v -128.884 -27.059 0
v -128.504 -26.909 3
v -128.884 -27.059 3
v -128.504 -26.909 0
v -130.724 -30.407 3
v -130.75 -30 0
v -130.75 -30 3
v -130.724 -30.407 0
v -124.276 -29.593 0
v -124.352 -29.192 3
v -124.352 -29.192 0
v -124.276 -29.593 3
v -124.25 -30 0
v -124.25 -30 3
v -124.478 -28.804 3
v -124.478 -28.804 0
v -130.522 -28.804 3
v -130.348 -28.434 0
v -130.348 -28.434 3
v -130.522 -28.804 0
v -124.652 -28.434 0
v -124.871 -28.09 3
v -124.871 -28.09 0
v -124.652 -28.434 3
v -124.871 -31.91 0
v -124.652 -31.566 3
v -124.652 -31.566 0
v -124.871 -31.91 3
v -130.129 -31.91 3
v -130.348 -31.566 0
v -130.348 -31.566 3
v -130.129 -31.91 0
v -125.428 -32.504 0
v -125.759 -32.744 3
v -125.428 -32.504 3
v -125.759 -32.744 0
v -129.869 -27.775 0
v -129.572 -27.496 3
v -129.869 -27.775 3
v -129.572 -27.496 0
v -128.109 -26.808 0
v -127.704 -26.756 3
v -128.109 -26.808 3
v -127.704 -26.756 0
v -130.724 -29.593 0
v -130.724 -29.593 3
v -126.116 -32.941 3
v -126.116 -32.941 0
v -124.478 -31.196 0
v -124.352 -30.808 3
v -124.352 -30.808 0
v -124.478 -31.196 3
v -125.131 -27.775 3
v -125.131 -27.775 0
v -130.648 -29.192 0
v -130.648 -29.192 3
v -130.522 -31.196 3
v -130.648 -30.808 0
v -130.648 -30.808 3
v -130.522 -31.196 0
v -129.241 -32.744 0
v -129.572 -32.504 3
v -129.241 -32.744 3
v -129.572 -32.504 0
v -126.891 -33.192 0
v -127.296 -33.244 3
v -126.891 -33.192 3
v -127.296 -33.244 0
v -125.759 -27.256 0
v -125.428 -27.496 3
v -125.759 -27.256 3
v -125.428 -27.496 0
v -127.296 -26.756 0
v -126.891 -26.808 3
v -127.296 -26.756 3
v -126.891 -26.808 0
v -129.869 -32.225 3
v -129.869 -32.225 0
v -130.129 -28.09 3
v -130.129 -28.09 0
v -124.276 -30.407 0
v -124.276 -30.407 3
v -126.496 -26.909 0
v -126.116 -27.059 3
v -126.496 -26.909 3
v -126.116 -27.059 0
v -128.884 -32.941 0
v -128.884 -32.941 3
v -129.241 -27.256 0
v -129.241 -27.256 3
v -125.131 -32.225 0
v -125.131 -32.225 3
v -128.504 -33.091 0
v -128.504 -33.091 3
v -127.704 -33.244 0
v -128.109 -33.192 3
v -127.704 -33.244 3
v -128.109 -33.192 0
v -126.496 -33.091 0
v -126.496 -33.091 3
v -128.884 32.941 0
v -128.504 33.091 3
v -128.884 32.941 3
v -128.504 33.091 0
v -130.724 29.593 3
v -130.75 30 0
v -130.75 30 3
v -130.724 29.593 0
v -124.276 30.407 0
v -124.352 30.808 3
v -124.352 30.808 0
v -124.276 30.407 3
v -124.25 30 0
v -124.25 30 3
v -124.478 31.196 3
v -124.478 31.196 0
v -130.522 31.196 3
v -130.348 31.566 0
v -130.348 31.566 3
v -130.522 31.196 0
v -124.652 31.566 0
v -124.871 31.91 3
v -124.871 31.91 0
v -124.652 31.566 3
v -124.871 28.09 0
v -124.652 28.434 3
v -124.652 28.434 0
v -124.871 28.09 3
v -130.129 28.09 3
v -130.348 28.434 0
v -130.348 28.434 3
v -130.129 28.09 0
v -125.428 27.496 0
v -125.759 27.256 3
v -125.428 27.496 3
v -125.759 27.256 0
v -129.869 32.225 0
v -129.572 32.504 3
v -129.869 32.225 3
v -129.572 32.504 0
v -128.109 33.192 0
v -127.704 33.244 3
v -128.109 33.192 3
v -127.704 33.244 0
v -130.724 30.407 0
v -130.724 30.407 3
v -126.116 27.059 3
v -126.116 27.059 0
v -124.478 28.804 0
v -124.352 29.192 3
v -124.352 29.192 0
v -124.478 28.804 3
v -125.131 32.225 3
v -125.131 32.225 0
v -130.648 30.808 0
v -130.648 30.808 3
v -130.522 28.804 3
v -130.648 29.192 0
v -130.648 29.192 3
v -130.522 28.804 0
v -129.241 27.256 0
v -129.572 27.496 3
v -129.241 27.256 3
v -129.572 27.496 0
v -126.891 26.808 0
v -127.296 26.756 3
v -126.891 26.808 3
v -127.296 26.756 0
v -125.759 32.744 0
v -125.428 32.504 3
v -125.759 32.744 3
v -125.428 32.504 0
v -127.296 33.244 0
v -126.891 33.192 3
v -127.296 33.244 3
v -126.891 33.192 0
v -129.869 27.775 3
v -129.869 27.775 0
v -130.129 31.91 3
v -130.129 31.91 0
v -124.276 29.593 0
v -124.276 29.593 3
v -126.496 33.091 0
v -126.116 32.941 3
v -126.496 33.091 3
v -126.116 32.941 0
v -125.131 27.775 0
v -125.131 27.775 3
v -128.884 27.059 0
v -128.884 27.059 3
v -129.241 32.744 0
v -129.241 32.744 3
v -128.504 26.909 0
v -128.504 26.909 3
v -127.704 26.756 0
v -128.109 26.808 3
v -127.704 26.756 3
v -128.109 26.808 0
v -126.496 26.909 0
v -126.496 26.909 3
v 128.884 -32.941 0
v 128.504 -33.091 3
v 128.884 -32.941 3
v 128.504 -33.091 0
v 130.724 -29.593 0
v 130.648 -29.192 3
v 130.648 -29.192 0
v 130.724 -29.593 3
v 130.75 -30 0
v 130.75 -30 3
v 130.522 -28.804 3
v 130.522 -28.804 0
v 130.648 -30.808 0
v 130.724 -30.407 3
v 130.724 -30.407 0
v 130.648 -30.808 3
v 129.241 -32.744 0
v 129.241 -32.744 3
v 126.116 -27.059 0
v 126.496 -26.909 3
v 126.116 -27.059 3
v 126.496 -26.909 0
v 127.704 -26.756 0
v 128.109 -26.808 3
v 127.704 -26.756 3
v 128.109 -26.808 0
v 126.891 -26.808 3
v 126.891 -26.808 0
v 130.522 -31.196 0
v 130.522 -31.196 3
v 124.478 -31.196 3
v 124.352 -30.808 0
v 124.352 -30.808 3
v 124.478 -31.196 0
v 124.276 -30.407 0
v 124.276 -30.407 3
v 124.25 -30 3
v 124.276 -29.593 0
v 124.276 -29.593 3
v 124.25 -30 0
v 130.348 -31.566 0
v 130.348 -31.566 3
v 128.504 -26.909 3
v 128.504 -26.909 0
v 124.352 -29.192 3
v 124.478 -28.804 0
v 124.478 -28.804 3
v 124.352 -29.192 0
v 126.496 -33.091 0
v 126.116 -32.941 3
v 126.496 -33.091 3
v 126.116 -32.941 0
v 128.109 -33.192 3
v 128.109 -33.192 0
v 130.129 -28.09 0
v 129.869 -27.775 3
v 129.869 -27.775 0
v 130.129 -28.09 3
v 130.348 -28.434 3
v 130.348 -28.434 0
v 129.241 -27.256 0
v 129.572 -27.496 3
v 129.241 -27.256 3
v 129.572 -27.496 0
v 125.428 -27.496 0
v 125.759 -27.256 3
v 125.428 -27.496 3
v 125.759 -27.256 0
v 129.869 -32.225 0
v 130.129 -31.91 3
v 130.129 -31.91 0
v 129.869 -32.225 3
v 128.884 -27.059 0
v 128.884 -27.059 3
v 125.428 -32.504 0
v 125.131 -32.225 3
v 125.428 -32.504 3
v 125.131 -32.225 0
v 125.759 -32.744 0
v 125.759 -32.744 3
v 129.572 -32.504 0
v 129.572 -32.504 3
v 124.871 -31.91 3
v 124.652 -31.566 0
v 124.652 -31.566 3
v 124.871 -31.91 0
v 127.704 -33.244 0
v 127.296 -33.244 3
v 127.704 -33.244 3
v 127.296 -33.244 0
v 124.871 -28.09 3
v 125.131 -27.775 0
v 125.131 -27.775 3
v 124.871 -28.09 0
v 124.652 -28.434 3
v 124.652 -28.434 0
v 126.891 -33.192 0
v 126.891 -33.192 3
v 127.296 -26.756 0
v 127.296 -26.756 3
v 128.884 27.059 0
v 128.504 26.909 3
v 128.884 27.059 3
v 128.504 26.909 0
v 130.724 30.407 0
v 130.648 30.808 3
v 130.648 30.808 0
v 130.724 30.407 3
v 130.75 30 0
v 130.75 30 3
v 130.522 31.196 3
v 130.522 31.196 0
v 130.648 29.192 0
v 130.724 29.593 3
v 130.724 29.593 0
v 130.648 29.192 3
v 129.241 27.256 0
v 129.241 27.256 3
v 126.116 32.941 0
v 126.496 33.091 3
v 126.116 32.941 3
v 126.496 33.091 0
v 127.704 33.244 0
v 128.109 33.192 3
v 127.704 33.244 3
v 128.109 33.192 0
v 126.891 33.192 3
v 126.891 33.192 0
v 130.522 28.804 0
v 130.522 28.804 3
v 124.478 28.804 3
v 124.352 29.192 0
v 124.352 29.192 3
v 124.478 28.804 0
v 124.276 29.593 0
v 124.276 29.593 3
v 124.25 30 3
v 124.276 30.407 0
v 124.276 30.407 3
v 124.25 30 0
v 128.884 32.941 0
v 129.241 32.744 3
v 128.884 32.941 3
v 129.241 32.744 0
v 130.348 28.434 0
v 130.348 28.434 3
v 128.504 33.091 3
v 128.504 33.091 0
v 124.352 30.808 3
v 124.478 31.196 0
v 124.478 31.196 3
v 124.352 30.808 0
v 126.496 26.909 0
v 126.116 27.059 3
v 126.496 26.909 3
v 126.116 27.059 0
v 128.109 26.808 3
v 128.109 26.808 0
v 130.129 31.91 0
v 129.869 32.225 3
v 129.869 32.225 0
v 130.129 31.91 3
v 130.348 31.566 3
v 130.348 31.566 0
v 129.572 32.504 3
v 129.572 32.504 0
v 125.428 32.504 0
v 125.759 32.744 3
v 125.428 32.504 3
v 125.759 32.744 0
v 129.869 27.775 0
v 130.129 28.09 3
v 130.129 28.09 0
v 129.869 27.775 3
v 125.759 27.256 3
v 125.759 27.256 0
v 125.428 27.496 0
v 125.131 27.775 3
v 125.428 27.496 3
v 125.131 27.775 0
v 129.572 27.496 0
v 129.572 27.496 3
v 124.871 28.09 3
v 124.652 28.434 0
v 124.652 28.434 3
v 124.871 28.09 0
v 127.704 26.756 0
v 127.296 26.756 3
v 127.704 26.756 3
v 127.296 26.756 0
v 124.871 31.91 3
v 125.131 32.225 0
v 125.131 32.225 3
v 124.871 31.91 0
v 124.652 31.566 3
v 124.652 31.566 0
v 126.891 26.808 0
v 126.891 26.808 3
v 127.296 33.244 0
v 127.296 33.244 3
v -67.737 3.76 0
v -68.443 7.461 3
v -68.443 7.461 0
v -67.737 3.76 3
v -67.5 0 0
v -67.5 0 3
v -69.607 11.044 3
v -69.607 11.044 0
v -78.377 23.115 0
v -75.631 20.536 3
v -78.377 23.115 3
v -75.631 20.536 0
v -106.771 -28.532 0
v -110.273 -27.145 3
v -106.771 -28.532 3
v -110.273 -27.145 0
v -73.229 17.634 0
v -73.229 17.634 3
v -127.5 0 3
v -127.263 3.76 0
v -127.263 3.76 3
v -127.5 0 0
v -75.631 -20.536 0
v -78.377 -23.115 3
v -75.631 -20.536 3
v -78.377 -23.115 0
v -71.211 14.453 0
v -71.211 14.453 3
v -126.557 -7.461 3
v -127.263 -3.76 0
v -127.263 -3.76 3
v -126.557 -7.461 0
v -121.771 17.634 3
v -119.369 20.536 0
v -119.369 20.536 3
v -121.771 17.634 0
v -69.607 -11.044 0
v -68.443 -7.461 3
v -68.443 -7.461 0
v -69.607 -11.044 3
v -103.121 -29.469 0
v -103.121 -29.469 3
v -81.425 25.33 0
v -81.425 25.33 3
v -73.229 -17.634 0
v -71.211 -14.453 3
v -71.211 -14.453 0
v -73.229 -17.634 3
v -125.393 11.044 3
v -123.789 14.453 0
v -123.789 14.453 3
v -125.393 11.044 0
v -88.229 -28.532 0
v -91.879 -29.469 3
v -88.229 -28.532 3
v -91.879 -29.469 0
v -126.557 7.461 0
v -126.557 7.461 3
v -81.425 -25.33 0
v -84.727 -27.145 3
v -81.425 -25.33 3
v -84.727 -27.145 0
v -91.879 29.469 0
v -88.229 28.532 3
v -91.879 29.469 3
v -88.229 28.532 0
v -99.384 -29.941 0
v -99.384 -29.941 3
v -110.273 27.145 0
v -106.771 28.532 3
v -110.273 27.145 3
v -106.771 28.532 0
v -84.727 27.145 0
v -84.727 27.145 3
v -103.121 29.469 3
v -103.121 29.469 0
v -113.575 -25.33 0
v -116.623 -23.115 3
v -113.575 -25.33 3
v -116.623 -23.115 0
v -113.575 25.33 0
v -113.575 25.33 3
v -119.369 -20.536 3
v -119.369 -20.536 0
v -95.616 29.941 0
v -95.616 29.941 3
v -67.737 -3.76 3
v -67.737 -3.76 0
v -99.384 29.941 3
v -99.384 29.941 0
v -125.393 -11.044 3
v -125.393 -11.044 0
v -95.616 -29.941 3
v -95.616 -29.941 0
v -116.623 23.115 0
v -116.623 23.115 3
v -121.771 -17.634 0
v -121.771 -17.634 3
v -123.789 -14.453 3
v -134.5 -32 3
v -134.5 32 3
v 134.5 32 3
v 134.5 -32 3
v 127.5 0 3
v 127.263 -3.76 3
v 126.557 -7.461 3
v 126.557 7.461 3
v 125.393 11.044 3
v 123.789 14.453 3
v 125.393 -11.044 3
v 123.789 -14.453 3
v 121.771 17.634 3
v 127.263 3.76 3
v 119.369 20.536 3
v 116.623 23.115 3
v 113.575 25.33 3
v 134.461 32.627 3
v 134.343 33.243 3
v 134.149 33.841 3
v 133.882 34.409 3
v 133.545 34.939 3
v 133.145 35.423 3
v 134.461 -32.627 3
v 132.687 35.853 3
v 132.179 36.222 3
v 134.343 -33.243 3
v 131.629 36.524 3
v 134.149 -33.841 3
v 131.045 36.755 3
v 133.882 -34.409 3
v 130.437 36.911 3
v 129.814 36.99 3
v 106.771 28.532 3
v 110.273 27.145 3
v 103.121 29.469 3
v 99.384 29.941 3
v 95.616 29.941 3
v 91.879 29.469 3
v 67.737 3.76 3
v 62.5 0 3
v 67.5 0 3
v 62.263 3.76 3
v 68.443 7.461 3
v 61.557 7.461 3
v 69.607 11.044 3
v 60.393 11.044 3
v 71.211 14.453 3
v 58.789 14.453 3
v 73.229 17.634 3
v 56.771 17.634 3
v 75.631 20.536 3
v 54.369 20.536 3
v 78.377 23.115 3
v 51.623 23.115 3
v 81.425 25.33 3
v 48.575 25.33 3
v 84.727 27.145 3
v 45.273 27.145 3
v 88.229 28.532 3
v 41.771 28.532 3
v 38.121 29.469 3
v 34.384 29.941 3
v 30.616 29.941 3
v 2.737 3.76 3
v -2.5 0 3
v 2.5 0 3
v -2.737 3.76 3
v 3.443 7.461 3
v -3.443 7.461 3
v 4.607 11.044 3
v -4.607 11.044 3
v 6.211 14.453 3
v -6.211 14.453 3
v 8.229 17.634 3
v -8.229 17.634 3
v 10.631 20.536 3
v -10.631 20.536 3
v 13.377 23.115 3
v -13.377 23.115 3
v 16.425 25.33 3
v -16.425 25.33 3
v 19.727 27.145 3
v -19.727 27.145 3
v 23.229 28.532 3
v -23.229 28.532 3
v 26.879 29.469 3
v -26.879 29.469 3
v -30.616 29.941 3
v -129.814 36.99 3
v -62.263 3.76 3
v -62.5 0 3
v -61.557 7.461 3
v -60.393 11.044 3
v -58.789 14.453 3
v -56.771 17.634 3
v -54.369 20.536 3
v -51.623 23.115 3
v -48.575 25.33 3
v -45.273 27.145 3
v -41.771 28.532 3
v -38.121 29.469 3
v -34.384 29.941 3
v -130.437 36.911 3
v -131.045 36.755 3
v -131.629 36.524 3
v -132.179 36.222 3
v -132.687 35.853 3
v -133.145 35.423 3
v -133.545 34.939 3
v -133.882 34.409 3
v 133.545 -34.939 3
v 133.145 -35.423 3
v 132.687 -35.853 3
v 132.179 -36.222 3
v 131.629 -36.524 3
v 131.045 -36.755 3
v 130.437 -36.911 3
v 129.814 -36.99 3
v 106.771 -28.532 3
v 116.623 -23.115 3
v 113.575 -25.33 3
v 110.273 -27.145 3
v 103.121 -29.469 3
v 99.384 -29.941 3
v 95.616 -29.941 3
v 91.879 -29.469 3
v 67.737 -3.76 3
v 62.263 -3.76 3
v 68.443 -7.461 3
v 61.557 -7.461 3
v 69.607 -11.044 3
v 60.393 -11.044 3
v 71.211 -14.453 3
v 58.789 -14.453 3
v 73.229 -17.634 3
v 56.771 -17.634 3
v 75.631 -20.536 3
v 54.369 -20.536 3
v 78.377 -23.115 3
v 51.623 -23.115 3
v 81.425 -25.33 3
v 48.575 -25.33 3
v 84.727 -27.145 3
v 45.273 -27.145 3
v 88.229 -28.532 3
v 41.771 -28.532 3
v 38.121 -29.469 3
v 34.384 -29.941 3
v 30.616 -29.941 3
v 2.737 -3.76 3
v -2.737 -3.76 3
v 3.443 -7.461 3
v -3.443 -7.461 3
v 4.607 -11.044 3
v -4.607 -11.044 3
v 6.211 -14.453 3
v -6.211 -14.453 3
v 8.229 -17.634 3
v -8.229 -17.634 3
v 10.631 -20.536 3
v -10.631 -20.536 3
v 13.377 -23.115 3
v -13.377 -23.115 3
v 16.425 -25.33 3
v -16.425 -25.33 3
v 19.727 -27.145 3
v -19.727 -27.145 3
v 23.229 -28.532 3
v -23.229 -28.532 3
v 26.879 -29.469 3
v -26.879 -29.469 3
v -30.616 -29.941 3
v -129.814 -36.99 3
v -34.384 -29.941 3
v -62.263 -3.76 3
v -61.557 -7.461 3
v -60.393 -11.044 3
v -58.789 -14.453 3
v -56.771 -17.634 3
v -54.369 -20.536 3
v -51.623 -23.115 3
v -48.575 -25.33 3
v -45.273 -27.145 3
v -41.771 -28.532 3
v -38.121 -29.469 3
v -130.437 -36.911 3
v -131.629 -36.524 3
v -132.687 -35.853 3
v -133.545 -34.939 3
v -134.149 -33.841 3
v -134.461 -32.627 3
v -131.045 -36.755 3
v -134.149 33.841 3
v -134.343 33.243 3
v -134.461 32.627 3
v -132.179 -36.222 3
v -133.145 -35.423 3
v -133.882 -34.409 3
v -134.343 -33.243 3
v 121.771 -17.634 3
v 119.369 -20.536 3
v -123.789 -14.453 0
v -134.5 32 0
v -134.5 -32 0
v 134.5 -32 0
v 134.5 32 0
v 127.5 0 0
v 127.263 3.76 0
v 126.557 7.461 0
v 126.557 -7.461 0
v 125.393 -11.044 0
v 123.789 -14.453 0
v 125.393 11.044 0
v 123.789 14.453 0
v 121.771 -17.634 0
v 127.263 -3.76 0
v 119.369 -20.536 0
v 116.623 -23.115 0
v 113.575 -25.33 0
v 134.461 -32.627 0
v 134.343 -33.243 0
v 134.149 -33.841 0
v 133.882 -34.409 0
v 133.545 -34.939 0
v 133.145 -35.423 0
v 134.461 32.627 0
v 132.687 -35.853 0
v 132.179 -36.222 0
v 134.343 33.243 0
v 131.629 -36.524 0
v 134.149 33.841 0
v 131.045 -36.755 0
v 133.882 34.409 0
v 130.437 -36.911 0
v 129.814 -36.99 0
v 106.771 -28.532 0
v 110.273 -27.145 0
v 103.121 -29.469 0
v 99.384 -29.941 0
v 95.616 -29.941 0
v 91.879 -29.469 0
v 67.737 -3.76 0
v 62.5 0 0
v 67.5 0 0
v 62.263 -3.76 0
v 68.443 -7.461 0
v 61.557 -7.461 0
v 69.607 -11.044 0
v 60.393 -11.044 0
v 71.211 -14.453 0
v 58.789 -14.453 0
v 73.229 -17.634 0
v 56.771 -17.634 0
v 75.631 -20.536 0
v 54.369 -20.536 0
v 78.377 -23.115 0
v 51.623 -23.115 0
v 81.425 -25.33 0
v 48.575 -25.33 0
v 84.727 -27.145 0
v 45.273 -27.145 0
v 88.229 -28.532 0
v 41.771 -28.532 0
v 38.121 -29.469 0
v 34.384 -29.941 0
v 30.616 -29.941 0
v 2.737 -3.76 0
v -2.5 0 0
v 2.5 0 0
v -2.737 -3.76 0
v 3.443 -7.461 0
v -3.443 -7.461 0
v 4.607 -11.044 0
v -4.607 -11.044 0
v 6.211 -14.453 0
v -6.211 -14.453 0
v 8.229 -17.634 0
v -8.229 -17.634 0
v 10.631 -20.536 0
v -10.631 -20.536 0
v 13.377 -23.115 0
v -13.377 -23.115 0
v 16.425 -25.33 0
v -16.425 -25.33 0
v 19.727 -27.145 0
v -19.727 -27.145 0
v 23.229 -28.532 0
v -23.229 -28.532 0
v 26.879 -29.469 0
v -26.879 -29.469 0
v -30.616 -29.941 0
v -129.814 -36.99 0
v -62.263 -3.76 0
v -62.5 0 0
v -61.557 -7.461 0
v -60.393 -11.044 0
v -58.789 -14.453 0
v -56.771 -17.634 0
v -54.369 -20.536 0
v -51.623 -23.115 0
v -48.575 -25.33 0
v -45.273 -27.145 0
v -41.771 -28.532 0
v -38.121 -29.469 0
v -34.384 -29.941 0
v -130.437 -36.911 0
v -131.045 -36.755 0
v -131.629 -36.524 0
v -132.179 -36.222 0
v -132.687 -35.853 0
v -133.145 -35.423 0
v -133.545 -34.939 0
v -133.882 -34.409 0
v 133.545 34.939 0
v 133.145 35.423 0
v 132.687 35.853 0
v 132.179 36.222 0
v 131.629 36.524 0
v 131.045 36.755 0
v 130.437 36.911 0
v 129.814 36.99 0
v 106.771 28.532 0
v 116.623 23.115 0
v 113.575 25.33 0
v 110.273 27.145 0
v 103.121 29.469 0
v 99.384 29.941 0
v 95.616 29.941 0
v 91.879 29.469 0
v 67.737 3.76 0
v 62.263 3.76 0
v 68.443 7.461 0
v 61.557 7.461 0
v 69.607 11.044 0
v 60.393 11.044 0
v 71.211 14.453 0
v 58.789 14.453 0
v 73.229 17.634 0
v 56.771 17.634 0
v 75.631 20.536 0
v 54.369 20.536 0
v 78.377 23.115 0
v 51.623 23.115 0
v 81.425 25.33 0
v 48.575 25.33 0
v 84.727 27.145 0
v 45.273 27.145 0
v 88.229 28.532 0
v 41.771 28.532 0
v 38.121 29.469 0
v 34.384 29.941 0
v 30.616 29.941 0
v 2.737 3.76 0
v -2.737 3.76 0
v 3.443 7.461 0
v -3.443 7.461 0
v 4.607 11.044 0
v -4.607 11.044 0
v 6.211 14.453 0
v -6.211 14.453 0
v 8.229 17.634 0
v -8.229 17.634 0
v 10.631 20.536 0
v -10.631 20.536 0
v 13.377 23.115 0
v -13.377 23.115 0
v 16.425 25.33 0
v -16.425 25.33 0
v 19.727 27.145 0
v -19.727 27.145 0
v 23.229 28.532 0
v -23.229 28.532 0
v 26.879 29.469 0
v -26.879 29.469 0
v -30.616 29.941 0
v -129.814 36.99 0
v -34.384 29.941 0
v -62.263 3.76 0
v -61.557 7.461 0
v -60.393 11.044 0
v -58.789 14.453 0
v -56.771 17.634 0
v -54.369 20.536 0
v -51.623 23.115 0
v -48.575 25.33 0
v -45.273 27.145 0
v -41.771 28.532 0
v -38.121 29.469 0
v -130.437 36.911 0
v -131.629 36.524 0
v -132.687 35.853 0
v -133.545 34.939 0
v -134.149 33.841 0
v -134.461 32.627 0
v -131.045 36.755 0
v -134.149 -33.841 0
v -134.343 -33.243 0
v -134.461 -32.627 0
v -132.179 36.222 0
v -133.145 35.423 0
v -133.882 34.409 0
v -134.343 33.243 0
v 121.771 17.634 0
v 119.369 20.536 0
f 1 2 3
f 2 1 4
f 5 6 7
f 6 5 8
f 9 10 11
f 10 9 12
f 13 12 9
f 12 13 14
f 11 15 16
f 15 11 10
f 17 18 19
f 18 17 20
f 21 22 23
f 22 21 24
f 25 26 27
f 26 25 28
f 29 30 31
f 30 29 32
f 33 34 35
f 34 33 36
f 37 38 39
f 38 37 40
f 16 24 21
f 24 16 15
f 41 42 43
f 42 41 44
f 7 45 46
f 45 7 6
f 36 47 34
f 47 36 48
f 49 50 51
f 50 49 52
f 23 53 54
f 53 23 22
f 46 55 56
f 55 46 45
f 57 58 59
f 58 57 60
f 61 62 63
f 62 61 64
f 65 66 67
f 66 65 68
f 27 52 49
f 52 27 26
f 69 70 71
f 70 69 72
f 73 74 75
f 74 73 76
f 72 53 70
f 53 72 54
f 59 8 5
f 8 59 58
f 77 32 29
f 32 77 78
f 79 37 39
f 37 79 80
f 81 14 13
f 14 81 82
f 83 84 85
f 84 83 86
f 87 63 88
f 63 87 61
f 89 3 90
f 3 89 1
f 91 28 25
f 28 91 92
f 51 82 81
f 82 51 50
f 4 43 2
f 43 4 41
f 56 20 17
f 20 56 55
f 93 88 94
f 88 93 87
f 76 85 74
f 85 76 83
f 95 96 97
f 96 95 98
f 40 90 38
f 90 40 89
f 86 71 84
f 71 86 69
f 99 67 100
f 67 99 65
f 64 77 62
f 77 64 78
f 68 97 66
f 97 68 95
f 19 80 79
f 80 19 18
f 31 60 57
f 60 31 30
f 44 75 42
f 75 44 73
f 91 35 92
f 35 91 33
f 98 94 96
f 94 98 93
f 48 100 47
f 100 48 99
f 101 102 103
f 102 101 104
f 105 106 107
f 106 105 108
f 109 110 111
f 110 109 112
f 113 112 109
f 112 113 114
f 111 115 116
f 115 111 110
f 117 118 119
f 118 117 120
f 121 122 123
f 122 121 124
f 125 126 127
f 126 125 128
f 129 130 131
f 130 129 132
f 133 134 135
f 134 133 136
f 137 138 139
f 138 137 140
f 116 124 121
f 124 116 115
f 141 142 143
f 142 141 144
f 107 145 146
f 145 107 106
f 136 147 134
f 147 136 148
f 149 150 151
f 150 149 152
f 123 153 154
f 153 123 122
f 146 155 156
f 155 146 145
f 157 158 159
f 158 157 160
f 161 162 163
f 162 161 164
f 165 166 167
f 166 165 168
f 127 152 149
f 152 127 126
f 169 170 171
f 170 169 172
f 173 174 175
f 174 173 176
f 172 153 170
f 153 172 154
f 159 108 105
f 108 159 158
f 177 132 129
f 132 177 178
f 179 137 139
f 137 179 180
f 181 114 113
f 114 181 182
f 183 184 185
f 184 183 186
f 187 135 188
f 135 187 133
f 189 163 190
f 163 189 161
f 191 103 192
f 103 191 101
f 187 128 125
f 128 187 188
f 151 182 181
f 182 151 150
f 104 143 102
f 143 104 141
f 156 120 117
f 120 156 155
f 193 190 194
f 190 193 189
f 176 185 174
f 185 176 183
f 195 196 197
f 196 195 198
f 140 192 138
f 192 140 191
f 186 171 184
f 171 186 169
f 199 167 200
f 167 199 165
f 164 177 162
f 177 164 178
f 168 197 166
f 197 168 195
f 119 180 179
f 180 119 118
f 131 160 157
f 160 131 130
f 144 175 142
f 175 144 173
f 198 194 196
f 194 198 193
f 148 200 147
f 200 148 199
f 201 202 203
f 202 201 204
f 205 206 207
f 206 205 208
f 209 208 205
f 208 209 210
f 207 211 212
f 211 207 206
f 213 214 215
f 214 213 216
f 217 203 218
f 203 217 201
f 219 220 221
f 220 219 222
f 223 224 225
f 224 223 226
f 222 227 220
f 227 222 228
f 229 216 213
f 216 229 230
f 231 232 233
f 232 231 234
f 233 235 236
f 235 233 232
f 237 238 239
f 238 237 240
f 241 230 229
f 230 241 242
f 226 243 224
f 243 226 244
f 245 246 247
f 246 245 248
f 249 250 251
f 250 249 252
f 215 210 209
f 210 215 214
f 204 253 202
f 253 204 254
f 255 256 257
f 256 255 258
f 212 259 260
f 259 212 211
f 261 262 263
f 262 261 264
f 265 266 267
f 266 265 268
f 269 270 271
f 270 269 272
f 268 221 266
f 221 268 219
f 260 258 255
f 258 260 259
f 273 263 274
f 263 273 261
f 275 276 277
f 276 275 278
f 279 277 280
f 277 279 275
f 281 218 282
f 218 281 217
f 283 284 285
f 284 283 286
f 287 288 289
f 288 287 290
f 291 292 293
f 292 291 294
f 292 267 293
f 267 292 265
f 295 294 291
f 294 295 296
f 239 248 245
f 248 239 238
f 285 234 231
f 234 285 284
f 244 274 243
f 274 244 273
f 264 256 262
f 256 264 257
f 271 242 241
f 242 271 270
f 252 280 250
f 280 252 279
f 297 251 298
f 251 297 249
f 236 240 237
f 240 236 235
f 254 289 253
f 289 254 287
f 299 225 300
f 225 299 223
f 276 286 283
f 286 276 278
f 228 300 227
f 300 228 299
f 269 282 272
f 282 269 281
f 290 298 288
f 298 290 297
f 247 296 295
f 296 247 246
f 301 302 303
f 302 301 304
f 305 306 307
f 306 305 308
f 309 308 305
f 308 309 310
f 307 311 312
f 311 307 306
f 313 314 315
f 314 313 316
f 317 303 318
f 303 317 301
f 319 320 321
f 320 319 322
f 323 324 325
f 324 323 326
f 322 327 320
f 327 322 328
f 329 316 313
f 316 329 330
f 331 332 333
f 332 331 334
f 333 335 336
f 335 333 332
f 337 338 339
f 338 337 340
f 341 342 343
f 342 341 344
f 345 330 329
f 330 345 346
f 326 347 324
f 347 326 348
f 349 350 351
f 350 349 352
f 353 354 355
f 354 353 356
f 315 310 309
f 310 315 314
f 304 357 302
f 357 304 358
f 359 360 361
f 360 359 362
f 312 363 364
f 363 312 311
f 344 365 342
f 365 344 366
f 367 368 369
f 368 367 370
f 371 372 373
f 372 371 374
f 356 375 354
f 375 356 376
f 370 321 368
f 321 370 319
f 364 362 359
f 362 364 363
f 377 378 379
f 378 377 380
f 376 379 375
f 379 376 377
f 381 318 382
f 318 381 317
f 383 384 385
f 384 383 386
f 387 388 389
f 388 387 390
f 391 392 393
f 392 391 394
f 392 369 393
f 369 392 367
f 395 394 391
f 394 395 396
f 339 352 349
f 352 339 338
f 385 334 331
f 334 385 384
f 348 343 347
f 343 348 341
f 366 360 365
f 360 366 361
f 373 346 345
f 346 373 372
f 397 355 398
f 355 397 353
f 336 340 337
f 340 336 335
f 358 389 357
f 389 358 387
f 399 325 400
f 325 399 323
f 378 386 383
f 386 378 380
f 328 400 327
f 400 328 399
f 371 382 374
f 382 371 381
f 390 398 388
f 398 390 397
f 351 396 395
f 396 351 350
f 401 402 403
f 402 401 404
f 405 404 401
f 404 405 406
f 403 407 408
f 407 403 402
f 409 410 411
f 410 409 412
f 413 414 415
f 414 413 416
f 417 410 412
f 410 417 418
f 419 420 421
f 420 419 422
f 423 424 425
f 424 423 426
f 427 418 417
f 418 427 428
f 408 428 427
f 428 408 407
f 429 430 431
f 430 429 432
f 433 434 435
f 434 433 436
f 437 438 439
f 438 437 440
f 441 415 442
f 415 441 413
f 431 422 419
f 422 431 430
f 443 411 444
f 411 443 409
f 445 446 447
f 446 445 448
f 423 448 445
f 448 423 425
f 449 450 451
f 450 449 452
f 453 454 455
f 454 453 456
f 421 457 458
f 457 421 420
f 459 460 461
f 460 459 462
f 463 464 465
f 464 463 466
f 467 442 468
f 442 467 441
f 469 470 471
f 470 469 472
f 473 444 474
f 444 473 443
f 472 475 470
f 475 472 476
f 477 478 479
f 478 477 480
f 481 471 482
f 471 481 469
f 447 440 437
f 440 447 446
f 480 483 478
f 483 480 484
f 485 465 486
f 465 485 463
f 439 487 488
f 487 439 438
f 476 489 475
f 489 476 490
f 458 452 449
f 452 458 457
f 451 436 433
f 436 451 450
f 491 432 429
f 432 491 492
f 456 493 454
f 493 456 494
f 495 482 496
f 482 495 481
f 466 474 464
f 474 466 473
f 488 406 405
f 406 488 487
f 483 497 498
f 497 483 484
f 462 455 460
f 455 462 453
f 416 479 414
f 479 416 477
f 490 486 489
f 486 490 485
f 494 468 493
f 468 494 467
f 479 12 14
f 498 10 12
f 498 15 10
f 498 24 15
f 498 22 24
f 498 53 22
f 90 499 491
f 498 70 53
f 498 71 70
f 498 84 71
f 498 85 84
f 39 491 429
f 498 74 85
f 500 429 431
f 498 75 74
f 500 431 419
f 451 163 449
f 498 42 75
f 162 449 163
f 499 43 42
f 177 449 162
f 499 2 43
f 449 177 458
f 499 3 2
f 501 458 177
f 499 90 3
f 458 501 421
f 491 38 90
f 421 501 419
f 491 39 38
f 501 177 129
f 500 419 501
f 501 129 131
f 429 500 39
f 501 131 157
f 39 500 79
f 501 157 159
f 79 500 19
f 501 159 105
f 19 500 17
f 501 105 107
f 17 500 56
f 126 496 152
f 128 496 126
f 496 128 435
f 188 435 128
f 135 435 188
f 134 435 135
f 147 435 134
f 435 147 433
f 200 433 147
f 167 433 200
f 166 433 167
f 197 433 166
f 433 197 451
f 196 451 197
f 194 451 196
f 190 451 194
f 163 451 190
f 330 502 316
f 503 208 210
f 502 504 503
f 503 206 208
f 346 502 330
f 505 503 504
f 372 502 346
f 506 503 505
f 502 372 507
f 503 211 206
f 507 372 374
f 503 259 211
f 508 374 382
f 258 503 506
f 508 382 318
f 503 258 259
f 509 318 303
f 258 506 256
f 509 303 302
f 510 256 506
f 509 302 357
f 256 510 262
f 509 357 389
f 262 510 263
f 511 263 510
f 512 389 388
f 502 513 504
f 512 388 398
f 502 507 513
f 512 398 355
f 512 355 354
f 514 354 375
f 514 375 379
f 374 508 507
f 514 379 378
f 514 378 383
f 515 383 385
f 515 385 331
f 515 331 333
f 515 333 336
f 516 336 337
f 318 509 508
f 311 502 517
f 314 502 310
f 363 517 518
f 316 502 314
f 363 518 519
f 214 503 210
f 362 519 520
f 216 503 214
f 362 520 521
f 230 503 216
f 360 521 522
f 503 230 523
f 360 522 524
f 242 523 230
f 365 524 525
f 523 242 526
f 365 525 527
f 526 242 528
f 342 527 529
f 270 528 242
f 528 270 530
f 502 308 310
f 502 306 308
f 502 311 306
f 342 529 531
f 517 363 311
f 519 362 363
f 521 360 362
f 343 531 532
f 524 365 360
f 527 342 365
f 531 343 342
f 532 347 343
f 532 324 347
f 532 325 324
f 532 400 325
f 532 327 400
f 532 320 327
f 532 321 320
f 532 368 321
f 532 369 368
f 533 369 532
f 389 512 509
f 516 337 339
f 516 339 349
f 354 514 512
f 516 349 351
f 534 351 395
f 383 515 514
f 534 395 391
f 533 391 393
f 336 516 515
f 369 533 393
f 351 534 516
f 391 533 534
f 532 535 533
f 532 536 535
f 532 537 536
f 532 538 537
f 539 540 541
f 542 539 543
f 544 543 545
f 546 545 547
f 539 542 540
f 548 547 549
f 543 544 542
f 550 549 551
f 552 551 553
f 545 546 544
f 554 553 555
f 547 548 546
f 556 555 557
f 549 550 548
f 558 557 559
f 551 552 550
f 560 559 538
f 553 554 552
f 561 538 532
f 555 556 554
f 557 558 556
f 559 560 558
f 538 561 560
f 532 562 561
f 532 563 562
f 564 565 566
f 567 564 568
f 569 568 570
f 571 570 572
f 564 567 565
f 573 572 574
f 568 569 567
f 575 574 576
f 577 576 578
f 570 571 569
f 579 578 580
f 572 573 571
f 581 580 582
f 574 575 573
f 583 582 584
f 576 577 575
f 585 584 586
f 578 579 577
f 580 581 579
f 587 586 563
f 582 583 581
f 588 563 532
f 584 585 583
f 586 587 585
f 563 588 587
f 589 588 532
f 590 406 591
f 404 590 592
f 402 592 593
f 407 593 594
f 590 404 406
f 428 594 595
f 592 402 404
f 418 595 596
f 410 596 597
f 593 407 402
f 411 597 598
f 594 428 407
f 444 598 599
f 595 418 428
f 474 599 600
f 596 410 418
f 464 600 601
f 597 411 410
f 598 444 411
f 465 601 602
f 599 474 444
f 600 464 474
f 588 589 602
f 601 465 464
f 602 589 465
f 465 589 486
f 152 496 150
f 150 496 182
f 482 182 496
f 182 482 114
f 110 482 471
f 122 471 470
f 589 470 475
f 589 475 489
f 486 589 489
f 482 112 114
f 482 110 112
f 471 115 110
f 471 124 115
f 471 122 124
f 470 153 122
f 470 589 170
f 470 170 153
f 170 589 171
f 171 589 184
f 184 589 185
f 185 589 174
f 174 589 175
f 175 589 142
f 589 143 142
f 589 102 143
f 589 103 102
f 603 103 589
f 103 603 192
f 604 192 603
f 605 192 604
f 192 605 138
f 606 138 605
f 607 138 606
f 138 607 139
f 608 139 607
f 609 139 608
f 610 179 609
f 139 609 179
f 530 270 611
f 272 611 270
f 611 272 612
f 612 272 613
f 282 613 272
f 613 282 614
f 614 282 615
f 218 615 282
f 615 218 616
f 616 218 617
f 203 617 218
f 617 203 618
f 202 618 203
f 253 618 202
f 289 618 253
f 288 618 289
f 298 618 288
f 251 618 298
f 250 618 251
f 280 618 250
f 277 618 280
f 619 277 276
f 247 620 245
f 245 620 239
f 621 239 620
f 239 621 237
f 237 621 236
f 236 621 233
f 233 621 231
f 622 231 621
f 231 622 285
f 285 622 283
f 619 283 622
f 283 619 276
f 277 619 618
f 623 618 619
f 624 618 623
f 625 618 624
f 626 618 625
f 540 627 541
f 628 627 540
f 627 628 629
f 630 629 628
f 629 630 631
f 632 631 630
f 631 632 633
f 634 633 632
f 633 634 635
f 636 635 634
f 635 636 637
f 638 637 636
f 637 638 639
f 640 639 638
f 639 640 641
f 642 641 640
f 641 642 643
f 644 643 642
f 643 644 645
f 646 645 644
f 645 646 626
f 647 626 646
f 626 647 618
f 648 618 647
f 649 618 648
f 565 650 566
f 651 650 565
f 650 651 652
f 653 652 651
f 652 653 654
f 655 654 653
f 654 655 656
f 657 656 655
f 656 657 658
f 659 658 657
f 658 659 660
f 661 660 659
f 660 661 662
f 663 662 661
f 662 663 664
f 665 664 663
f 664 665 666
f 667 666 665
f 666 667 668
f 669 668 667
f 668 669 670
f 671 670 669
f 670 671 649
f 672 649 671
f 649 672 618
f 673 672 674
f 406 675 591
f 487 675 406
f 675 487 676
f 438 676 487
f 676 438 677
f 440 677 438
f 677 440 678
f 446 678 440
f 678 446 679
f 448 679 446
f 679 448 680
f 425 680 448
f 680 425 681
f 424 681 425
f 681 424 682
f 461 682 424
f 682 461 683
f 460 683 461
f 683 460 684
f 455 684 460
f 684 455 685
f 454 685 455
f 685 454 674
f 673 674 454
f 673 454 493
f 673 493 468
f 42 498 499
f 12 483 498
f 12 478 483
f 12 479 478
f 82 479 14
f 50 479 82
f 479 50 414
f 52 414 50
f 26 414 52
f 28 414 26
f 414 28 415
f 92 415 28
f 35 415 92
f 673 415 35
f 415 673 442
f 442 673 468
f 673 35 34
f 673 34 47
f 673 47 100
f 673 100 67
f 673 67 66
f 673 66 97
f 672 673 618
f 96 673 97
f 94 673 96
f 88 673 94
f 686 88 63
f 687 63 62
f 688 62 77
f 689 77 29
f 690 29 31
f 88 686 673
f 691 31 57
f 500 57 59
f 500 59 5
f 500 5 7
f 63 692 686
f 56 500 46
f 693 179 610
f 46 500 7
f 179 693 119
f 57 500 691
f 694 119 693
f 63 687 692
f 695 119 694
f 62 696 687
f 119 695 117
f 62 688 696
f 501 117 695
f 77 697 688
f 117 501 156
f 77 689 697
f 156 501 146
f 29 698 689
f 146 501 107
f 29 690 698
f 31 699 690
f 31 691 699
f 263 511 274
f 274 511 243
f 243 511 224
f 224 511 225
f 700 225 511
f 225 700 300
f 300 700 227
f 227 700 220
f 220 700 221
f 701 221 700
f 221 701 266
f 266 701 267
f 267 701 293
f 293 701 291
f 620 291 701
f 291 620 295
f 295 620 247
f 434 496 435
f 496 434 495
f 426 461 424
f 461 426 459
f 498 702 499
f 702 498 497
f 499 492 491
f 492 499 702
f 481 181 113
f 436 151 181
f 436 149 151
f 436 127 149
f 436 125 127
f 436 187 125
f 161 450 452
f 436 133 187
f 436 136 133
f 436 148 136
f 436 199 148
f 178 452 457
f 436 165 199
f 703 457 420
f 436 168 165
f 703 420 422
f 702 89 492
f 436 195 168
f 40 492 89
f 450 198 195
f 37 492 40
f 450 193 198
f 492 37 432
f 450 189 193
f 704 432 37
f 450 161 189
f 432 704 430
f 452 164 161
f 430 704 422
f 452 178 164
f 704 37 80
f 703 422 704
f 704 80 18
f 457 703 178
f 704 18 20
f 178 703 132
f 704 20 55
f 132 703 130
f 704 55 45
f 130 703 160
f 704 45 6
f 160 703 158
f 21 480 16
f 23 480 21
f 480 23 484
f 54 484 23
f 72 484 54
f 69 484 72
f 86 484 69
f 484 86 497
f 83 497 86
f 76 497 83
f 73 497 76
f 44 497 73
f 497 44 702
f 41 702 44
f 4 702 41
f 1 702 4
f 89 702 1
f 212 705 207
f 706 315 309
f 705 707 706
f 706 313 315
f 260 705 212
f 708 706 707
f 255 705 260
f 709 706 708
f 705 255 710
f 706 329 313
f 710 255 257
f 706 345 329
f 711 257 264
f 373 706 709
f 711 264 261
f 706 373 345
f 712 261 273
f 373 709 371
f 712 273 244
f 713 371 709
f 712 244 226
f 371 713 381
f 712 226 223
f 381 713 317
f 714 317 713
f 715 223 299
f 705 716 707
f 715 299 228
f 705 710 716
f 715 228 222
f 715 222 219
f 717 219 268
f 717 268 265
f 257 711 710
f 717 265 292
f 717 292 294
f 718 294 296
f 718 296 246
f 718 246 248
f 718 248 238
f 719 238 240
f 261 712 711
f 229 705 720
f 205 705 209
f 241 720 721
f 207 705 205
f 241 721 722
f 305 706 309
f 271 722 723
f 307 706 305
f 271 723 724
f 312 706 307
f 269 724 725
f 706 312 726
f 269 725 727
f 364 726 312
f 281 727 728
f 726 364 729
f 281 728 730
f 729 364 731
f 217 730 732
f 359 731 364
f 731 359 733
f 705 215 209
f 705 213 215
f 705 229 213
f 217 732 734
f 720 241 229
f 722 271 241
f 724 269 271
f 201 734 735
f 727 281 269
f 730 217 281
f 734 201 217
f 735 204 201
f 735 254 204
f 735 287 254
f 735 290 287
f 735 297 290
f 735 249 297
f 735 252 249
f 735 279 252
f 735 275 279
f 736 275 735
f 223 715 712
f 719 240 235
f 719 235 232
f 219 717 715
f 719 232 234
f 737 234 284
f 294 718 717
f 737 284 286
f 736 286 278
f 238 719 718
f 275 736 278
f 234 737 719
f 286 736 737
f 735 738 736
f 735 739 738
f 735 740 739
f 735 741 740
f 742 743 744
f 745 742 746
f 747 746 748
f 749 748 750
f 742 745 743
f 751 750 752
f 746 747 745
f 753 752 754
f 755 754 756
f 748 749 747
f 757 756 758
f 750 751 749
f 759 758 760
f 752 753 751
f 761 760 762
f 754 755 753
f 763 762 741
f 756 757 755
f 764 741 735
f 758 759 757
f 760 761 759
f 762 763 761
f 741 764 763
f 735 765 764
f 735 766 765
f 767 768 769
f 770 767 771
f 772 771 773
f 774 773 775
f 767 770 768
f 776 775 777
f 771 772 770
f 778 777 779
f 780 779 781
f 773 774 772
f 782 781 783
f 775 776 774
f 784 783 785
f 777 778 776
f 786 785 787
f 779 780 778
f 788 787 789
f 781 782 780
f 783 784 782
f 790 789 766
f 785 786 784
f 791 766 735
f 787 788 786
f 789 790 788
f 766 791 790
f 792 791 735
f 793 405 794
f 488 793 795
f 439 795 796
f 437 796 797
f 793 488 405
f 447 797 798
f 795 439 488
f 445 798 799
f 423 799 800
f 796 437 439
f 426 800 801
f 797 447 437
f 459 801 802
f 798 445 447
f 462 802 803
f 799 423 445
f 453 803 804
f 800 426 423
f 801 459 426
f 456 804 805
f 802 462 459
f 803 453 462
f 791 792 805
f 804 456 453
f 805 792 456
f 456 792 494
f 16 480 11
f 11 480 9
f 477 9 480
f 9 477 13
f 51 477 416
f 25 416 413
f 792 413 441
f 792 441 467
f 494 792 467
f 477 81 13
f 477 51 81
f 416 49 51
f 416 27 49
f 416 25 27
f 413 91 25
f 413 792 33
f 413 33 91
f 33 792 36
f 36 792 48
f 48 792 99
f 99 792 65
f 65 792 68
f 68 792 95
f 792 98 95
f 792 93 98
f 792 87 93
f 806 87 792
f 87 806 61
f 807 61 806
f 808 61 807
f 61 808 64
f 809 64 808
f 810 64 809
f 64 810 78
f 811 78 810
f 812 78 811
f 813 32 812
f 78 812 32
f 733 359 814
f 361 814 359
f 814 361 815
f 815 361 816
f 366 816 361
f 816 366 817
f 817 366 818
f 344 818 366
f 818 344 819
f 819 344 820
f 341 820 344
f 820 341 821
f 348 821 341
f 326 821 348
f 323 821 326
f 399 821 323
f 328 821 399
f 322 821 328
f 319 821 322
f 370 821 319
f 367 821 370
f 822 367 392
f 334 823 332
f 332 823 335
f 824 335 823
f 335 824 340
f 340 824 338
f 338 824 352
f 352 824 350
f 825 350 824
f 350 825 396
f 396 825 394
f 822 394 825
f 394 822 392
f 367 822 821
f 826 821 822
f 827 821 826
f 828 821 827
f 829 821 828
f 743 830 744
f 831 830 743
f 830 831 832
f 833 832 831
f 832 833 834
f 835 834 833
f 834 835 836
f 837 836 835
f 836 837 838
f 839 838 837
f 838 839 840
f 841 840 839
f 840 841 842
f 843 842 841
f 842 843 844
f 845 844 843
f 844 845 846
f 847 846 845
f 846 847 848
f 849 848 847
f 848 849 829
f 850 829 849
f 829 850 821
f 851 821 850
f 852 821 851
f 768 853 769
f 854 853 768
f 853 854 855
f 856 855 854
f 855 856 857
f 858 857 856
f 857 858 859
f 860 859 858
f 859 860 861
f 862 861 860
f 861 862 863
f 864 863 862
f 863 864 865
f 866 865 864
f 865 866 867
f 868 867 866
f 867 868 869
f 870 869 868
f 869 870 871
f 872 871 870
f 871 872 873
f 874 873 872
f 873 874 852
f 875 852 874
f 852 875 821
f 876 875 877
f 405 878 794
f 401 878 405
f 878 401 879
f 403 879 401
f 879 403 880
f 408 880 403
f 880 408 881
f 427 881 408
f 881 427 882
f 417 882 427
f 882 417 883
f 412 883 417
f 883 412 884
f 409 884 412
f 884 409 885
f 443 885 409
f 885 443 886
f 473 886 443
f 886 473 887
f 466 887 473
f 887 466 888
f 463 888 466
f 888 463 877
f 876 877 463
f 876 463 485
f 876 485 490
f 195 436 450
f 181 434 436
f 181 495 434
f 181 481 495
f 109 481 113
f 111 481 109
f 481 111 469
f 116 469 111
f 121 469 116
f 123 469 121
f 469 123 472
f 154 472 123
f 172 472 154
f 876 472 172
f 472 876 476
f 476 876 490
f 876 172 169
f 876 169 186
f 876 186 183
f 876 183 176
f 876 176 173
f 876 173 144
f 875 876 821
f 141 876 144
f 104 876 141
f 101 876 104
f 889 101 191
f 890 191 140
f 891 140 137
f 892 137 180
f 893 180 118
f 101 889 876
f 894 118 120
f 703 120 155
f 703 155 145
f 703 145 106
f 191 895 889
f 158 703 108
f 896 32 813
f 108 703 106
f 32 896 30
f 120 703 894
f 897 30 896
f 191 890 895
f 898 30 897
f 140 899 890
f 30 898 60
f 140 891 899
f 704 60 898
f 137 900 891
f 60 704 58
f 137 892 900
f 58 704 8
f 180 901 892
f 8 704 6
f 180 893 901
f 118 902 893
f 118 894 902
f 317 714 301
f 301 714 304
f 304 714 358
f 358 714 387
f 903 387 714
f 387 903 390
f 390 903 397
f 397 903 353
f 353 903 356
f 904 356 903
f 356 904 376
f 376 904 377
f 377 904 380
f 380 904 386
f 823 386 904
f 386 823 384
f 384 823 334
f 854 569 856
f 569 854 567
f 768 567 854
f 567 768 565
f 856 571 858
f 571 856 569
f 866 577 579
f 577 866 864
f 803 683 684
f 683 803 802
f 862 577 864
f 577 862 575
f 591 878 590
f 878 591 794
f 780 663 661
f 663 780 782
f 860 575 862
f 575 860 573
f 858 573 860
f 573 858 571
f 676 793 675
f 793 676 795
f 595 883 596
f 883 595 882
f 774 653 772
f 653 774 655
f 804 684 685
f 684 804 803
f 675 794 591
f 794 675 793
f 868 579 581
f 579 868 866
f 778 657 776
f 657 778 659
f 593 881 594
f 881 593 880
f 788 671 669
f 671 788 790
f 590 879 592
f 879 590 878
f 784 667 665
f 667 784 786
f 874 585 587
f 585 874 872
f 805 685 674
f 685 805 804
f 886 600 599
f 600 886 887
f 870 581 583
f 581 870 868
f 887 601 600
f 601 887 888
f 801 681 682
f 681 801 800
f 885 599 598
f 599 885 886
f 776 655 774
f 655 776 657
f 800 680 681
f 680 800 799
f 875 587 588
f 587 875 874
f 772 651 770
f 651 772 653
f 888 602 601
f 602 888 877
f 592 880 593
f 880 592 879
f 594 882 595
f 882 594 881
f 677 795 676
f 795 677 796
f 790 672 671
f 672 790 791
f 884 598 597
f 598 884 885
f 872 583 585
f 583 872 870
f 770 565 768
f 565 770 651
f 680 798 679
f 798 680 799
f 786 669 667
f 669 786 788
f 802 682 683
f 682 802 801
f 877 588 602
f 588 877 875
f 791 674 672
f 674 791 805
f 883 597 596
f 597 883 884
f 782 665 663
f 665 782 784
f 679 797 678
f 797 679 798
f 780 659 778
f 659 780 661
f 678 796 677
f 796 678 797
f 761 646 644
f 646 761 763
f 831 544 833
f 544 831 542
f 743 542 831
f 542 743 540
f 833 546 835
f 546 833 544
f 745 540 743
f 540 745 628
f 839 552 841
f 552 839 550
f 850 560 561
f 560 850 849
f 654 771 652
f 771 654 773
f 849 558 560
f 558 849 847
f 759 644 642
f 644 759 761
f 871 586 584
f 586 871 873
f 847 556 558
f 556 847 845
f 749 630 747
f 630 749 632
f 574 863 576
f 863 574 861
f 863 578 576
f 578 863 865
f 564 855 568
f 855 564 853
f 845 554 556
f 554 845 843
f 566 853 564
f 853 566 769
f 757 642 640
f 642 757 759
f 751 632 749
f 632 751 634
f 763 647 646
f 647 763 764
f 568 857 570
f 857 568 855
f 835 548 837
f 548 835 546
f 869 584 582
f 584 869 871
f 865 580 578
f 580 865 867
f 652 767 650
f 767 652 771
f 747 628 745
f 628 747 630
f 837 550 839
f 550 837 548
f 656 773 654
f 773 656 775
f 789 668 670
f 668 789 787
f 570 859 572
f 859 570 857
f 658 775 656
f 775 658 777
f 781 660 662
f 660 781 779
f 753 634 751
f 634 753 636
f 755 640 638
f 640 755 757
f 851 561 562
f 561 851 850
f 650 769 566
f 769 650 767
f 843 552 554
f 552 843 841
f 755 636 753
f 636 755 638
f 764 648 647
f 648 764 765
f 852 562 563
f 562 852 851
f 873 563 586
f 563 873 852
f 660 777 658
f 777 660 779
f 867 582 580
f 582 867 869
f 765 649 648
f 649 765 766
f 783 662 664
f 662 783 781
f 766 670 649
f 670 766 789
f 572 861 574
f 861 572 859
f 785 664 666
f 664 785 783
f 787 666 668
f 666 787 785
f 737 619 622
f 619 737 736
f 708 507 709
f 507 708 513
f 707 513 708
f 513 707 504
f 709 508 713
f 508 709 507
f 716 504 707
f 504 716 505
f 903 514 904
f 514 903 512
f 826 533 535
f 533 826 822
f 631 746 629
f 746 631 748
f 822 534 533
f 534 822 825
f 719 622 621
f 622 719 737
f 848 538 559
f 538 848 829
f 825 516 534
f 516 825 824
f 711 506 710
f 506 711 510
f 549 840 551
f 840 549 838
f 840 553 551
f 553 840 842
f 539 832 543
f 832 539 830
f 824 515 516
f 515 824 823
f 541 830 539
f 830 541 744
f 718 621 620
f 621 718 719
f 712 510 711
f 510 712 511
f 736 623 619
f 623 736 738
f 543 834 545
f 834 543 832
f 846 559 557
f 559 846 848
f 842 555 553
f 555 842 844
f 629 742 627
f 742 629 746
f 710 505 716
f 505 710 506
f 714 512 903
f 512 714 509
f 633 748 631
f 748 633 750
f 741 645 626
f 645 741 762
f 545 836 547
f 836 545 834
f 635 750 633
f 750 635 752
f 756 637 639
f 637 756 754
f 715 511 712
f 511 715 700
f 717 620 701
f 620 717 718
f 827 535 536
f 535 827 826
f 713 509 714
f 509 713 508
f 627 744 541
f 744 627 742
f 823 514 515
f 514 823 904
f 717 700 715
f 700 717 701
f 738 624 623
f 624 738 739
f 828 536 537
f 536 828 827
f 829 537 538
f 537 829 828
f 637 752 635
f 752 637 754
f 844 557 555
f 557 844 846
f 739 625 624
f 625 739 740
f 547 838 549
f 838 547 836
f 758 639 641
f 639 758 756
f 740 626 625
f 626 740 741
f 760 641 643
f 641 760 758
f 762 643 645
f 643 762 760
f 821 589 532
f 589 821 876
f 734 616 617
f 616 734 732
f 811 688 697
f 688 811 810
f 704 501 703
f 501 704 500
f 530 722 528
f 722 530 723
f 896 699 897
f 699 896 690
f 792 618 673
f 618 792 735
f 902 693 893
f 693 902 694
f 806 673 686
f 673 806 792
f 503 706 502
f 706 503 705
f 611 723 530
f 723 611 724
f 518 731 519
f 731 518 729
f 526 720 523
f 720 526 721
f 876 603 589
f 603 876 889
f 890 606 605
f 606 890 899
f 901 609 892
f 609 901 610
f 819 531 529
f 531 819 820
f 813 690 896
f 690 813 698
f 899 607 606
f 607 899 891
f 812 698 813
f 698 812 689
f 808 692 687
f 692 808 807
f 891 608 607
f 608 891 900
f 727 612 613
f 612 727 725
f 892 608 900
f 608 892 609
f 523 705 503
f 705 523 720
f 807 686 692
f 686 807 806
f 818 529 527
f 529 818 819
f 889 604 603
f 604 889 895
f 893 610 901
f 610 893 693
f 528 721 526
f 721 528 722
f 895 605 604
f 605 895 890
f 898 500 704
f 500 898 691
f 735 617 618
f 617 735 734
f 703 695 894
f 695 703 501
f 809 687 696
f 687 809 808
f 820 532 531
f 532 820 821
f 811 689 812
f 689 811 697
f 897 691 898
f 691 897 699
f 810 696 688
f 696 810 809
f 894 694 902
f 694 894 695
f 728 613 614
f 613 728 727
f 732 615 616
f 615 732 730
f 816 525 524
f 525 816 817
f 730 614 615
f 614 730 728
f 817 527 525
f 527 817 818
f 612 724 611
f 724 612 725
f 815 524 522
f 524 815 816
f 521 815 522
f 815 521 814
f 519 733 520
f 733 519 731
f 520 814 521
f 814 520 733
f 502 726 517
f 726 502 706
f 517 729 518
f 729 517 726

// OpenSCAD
$fn = 50;


difference() {
	union() {
		hull() {
			translate(v = [-129.5000000000, 32.0000000000, 0]) {
				cylinder(h = 3, r = 5);
			}
			translate(v = [129.5000000000, 32.0000000000, 0]) {
				cylinder(h = 3, r = 5);
			}
			translate(v = [-129.5000000000, -32.0000000000, 0]) {
				cylinder(h = 3, r = 5);
			}
			translate(v = [129.5000000000, -32.0000000000, 0]) {
				cylinder(h = 3, r = 5);
			}
		}
	}
	union() {
		#translate(v = [-127.5000000000, -30.0000000000, -100.0000000000]) {
			cylinder(h = 200, r = 3.2500000000);
		}
		#translate(v = [-127.5000000000, 30.0000000000, -100.0000000000]) {
			cylinder(h = 200, r = 3.2500000000);
		}
		#translate(v = [127.5000000000, -30.0000000000, -100.0000000000]) {
			cylinder(h = 200, r = 3.2500000000);
		}
		#translate(v = [127.5000000000, 30.0000000000, -100.0000000000]) {
			cylinder(h = 200, r = 3.2500000000);
		}
		#translate(v = [-97.5000000000, 0, 0]) {
			cylinder(h = 3, r = 30.0000000000);
		}
		#translate(v = [-32.5000000000, 0, 0]) {
			cylinder(h = 3, r = 30.0000000000);
		}
		#translate(v = [32.5000000000, 0, 0]) {
			cylinder(h = 3, r = 30.0000000000);
		}
		#translate(v = [97.5000000000, 0, 0]) {
			cylinder(h = 3, r = 30.0000000000);
		}
	}
}
